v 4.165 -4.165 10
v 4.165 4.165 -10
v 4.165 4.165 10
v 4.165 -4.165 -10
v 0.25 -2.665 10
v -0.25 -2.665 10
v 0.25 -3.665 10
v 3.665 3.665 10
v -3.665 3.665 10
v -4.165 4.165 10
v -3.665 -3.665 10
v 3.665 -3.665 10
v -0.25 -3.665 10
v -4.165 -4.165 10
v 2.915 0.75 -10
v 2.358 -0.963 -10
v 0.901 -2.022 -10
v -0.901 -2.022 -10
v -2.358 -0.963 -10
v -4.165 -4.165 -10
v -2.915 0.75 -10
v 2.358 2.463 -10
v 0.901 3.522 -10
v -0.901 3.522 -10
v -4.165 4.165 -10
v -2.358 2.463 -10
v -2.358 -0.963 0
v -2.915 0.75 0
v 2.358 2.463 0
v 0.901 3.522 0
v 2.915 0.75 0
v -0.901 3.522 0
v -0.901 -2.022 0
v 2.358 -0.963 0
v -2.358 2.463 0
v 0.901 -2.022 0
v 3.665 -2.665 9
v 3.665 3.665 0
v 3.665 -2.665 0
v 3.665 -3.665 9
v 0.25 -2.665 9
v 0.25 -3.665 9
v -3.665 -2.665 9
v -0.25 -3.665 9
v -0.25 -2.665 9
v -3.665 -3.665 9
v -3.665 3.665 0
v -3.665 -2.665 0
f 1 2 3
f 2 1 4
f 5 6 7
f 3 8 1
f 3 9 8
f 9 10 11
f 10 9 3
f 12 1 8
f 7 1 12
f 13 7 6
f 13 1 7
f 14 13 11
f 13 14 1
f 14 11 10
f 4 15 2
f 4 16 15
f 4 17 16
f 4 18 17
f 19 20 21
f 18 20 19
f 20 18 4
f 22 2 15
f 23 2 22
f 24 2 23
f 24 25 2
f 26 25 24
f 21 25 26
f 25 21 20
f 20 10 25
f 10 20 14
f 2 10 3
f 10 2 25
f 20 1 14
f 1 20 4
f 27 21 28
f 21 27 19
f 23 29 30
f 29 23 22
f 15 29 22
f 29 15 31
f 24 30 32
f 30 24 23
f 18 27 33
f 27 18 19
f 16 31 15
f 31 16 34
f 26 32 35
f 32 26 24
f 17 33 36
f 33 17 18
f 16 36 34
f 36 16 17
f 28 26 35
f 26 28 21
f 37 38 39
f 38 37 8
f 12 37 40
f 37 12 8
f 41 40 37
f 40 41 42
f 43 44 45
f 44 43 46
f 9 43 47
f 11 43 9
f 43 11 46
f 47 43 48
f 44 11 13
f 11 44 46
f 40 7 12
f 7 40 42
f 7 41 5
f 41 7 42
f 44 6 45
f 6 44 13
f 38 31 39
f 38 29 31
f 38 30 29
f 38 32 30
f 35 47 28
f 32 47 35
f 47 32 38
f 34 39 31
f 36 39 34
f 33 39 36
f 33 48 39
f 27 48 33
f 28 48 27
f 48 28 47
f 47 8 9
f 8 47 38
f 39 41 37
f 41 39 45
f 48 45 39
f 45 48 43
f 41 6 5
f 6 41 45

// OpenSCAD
echo(version=version());

// cylinder portion of the group
// my units are [g], [cm], [s]
// want operating volume to be max 500 mL
// Density of naval brass is 8.41 g/cm^3
// With a bore of 5.83 cm, a stroke of 3.75 cm has a volume of 100 mL and a
//     stroke of 3 cm has a volume of 80 mL

// Constants here
bore = 5.83; // cm
bore_h = 10; // cm
min_wall_thick = 0.5; // cm
max_wall_thick = 2; // cm
group_h = 20; // cm

hopper_min_wall_thick = 0.5;
hopper_back_wall_thick = 1.5;
lever_tooth_h = 1;
lever_tooth_l = 0.5; // y distance of tooth for the lever


cartridge_heater_d = 1; // cm
cartridge_heater_h = 10; // cm
cartridge_heater_notch_h = 1;// cm
post_d = 1.5; // cm
post_hole_h = 2; // cm

screen_d_delta = 0.5;
screen_h = 0.5;

// calcs here for geometries
l = bore + min_wall_thick + max_wall_thick; //group len and width
w = l;

hl = l- 2*hopper_min_wall_thick;
hw = l - hopper_min_wall_thick - hopper_back_wall_thick;
hh = group_h - bore_h;

// calcs here to output volume
cyl_vol = 3.1415*pow((bore/2),2) * bore_h;
hopper_vol = hl*hw*(hh-lever_tooth_h);
total_vol = l*w*(group_h-lever_tooth_h);

//modules below


module bored_rect(sz=[10,10,10], r=2, pos=[0,2]){

  mml = [min(pos[0]-r, -sz[0]/2), max(pos[0]+r,sz[0]/2), min(pos[1]-r, -sz[1]/2), max(pos[1]+r,sz[1]/2)];
  /*echo(mml);*/
  if(mml!=[-sz[0]/2, sz[0]/2, -sz[1]/2, sz[1]/2] ) {
    echo("Error in BORED_RECT: bore exceeds rectangle");
  }
  else{
    difference(){
      cube(sz, center=true);
      translate([pos[0],pos[1],0]){cylinder(h=sz[2]+0.001, r=r, center=true);
  }}}}


module hopper_negative(sz=[10,10,10], tooth_h=1, tooth_w=2, tooth_l=0.5 ){
  echo(sz);
  union(){
    cube(sz, center=true);
    translate([0, -sz[1]/2-tooth_w/2, sz[2]/2-tooth_h/2]){
      difference(){
        cube([sz[0], tooth_w+0.0001, tooth_h], center=true);
        cube([tooth_l, tooth_w+0.0001, tooth_h], center=true);
}}}}

module group(){
  difference(){
    bored_rect(sz=[l,w,group_h], r=bore/2, pos=[0,w/2-bore/2-min_wall_thick]);
    translate([0,w/2-hw/2-hopper_min_wall_thick,group_h/2-hh/2]){ hopper_negative([hl,hw,hh], lever_tooth_h,
      hopper_back_wall_thick-hopper_min_wall_thick, lever_tooth_l);}
}}


// outputs here
echo("total volume is ", total_vol, " cm^3");
echo("cylinder volume is ", cyl_vol, " cm^3");
echo("hopper volume is ", hopper_vol, " cm^3");
echo("water volume is ", hopper_vol+cyl_vol, " cm^3");
echo("brass volume is ", total_vol-hopper_vol-cyl_vol, " cm^3");


/*bored_rect(sz=[l,w,group_h], r=bore/2, pos=[0,w/2-bore/2-min_wall_thick]);*/
/*hopper_negative([hl,hw,hh], lever_tooth_h,*/
  /*hopper_back_wall_thick-hopper_min_wall_thick, lever_tooth_l);*/
/*hopper_negative();*/

/*echo([hl,hw,hh]);*/
/*echo(sz);*/
group();
